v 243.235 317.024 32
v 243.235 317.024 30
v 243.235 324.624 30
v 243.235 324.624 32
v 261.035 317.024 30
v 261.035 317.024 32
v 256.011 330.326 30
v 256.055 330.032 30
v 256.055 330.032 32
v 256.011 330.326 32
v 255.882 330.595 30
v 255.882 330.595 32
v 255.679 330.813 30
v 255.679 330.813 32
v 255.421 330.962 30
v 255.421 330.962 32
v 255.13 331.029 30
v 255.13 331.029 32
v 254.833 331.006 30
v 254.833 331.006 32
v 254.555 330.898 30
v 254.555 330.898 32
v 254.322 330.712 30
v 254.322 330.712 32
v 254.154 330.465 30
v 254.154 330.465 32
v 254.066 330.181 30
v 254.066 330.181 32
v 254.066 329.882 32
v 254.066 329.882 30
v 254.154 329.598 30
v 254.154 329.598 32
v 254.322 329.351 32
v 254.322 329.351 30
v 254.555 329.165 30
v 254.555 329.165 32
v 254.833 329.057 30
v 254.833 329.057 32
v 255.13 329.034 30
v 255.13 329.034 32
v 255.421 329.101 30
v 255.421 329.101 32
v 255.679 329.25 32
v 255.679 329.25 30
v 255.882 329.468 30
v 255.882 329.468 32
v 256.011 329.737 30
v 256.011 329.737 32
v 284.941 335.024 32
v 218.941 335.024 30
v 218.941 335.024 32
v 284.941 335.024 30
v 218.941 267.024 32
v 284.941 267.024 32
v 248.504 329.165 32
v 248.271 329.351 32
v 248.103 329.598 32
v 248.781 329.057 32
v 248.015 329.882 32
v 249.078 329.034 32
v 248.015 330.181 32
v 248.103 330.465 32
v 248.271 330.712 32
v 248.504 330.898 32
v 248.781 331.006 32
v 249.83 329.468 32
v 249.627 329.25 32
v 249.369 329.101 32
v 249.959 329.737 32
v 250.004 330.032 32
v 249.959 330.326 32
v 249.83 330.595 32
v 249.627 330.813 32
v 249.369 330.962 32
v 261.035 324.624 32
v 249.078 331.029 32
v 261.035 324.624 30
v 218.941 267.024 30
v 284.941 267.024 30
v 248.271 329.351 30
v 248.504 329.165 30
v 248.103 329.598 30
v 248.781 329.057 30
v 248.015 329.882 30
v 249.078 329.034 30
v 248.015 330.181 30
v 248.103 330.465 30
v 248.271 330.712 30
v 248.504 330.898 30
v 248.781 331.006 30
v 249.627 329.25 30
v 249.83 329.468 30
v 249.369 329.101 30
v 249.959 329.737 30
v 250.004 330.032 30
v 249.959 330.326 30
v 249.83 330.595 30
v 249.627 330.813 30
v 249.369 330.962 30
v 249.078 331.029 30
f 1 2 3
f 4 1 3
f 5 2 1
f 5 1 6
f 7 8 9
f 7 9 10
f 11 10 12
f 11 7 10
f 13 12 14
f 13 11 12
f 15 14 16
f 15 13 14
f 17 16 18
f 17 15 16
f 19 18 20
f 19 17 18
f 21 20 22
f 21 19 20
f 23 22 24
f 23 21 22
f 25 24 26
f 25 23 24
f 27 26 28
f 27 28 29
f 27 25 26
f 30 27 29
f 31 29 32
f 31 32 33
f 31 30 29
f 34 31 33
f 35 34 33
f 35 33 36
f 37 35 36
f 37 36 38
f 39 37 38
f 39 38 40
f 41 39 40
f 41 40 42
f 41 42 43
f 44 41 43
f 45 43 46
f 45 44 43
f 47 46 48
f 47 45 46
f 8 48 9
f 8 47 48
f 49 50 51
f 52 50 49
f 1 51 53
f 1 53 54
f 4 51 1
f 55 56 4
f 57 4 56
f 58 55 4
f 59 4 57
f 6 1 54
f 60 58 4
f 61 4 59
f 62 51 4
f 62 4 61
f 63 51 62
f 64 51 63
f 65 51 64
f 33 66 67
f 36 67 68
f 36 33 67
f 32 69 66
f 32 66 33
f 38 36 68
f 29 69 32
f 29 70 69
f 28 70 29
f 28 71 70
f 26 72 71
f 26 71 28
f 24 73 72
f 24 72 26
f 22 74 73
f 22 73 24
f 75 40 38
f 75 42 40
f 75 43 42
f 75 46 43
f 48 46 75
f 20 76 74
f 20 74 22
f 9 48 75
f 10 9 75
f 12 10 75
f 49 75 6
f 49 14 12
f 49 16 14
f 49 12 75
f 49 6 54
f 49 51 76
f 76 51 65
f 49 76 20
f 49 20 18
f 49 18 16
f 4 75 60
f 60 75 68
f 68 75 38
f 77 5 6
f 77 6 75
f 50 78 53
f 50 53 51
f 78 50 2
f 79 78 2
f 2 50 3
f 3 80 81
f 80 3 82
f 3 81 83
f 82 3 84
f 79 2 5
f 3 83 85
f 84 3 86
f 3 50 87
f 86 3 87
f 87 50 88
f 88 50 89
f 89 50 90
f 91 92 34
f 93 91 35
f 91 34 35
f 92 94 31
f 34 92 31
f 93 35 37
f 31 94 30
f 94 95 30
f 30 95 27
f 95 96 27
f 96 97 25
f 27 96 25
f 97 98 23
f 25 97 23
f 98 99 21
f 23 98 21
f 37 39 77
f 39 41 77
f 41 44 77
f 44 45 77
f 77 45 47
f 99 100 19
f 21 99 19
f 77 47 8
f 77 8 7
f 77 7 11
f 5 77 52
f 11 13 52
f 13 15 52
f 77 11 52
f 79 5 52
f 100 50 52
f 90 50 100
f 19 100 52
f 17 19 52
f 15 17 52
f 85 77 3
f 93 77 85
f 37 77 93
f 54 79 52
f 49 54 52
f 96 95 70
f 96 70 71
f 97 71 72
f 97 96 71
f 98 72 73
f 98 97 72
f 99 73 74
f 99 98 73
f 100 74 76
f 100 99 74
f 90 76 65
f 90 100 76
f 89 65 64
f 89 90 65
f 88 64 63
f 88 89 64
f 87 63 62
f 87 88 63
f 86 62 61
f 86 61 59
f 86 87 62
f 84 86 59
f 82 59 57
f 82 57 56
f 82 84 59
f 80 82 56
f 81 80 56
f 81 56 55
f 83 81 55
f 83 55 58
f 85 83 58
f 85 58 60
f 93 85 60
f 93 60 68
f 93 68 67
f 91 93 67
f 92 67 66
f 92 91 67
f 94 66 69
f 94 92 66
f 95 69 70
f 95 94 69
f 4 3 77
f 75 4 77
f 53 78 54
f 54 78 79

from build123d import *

# Parameters (mm, degrees)
SKETCH1_W           = 66
SKETCH1_H           = 68
SKETCH1_R           = 1
SKETCH1_W_2         = 17.8
SKETCH1_H_2         = 7.6
BOSS_EXTRUDE1_DEPTH = 2


with BuildPart() as part:
    # Sketch1 → Boss-Extrude1 (new body)
    with BuildSketch(Plane.XY.offset(30)):
        with Locations((251.940861289, 301.024014524)):
            Rectangle(SKETCH1_W, SKETCH1_H)
        with Locations((249.003592831, 330.031505481)):
            Circle(SKETCH1_R, mode=Mode.SUBTRACT)
        with Locations((255.055282531, 330.031505481)):
            Circle(SKETCH1_R, mode=Mode.SUBTRACT)
        with Locations((252.135035756, 320.823888471)):
            Rectangle(SKETCH1_W_2, SKETCH1_H_2, mode=Mode.SUBTRACT)
    extrude(amount=BOSS_EXTRUDE1_DEPTH)


solid = part.part
